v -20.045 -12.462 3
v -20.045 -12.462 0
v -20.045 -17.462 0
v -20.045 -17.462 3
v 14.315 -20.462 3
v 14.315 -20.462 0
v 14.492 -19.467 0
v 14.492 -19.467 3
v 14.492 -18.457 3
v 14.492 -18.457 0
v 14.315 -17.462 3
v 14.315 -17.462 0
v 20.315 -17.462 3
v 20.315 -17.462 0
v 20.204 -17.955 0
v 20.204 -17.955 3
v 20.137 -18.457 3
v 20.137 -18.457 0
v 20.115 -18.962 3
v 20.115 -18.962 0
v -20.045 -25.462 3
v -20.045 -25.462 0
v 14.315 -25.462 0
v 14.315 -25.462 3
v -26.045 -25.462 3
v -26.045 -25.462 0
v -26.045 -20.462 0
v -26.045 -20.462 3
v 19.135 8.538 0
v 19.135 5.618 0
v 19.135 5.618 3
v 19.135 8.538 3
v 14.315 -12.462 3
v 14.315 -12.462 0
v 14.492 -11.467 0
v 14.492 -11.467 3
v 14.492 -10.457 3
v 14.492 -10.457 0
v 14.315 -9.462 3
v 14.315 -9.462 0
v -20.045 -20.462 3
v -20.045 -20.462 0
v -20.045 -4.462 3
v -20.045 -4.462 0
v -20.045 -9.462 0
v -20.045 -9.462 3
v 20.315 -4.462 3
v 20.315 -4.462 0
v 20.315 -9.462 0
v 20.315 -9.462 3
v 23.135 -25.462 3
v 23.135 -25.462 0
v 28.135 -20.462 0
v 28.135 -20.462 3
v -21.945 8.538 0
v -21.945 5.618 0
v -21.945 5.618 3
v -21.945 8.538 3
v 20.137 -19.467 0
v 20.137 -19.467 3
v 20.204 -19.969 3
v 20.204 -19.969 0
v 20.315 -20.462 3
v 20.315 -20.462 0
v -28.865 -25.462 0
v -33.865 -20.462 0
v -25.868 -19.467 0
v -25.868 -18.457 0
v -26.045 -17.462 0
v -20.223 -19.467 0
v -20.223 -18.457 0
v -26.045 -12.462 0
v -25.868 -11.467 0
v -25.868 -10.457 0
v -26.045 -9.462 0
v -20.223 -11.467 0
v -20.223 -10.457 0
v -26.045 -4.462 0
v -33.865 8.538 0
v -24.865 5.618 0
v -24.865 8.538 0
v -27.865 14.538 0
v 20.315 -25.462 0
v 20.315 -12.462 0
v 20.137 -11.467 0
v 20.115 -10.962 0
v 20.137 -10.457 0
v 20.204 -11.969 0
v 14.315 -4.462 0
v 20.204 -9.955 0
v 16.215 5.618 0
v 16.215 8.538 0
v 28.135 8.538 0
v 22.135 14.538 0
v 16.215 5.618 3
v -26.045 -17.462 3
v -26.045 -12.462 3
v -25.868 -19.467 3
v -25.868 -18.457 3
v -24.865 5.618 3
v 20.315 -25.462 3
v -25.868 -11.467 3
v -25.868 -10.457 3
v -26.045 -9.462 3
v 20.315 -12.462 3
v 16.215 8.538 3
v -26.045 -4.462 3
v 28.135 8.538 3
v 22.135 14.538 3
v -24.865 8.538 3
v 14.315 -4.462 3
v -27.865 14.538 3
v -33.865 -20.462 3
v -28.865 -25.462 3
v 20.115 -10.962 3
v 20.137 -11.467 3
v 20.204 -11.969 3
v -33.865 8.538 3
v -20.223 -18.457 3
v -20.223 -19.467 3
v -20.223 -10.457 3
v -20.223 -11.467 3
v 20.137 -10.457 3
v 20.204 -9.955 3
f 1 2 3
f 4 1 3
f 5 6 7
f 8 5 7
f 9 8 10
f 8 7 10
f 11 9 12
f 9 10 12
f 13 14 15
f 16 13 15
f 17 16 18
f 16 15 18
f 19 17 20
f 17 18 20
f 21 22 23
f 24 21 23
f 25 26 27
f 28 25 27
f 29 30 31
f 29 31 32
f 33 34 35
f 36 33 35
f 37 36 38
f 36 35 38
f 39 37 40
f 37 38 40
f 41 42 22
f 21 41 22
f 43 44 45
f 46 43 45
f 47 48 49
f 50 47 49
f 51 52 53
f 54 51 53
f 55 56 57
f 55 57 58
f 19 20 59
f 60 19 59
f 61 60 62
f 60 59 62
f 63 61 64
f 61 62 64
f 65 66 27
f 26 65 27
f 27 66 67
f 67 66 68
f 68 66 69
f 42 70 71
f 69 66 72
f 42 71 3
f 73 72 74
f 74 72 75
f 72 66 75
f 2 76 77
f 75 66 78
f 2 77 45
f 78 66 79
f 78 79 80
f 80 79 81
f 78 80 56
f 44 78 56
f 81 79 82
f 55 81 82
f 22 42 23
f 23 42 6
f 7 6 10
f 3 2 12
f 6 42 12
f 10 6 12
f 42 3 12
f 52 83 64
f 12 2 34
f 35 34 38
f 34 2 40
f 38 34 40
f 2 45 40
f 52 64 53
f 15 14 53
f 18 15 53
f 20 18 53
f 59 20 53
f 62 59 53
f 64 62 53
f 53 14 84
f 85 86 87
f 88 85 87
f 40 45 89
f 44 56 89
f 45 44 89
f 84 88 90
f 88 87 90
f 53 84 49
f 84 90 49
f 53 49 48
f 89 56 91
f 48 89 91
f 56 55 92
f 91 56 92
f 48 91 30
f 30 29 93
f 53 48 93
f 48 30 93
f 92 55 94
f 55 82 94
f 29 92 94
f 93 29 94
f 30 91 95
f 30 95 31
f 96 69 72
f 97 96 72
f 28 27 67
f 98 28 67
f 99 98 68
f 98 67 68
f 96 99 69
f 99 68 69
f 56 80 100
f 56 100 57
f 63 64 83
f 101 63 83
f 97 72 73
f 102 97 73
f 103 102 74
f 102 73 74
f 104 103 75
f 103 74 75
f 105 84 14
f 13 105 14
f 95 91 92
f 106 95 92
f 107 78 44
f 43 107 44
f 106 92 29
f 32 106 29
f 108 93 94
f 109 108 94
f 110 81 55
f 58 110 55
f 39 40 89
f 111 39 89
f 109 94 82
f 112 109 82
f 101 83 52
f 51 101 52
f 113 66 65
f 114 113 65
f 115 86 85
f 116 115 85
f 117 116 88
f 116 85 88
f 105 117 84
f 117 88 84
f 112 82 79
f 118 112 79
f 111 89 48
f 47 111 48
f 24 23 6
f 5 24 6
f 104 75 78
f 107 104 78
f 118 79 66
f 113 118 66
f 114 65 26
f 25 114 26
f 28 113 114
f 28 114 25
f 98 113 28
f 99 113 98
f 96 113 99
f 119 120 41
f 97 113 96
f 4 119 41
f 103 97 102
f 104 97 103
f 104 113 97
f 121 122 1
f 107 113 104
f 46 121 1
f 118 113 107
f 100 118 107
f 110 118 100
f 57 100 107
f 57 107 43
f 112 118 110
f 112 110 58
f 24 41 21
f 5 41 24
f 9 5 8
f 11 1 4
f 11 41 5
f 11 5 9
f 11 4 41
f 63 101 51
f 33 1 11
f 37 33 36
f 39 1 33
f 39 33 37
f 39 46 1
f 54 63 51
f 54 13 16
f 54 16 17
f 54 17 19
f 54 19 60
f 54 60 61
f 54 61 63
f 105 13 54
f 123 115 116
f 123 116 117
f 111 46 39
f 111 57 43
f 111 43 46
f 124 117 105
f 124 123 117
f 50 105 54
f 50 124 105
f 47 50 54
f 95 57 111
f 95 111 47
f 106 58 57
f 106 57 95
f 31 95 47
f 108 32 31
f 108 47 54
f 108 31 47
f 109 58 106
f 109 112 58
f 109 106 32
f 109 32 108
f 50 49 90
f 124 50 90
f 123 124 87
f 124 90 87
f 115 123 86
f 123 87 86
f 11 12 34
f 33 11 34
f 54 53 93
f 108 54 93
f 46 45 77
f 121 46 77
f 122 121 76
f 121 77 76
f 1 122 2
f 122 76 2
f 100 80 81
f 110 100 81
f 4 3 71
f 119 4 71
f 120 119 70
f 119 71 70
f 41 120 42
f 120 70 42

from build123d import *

# Parameters (mm, degrees)
SKETCH1_W           = 2.92
SKETCH1_H           = 2.92
BOSS_EXTRUDE1_DEPTH = 3


with BuildPart() as part:
    # Sketch1 → Boss-Extrude1 (new body)
    with BuildSketch(Plane.XY):
        with BuildLine():
            Line((28.134570185, 8.537968033), (22.134570185, 14.537968033))
            Line((22.134570185, 14.537968033), (-27.865429815, 14.537968033))
            Line((-27.865429815, 14.537968033), (-33.865429815, 8.537968033))
            Line((-33.865429815, 8.537968033), (-33.865429815, -20.462031967))
            Line((-33.865429815, -20.462031967), (-28.865429815, -25.462031967))
            Line((-28.865429815, -25.462031967), (-26.045429815, -25.462031967))
            Line((-26.045429815, -25.462031967), (-26.045429815, -20.462031967))
            ThreePointArc((-26.045429815, -20.462031967), (-25.845429815, -18.962031967), (-26.045429815, -17.462031967))
            Line((-26.045429815, -17.462031967), (-26.045429815, -12.462031967))
            ThreePointArc((-26.045429815, -12.462031967), (-25.845429815, -10.962031967), (-26.045429815, -9.462031967))
            Line((-26.045429815, -9.462031967), (-26.045429815, -4.462031967))
            Line((-26.045429815, -4.462031967), (-20.045429815, -4.462031967))
            Line((-20.045429815, -4.462031967), (-20.045429815, -9.462031967))
            ThreePointArc((-20.045429815, -9.462031967), (-20.245429815, -10.962031967), (-20.045429815, -12.462031967))
            Line((-20.045429815, -12.462031967), (-20.045429815, -17.462031967))
            ThreePointArc((-20.045429815, -17.462031967), (-20.245429815, -18.962031967), (-20.045429815, -20.462031967))
            Line((-20.045429815, -20.462031967), (-20.045429815, -25.462031967))
            Line((-20.045429815, -25.462031967), (14.314570185, -25.462031967))
            Line((14.314570185, -25.462031967), (14.314570185, -20.462031967))
            ThreePointArc((14.314570185, -20.462031967), (14.514570185, -18.962031967), (14.314570185, -17.462031967))
            Line((14.314570185, -17.462031967), (14.314570185, -12.462031967))
            ThreePointArc((14.314570185, -12.462031967), (14.514570185, -10.962031967), (14.314570185, -9.462031967))
            Line((14.314570185, -9.462031967), (14.314570185, -4.462031967))
            Line((14.314570185, -4.462031967), (20.314570185, -4.462031967))
            Line((20.314570185, -4.462031967), (20.314570185, -9.462031967))
            ThreePointArc((20.314570185, -9.462031967), (20.164790454, -10.20539467), (20.114570185, -10.962031967))
            ThreePointArc((20.114570185, -10.962031967), (20.164790454, -11.718669265), (20.314570185, -12.462031967))
            Line((20.314570185, -12.462031967), (20.314570185, -17.462031967))
            ThreePointArc((20.314570185, -17.462031967), (20.164790454, -18.20539467), (20.114570185, -18.962031967))
            ThreePointArc((20.114570185, -18.962031967), (20.164790454, -19.718669265), (20.314570185, -20.462031967))
            Line((20.314570185, -20.462031967), (20.314570185, -25.462031967))
            Line((20.314570185, -25.462031967), (23.134570185, -25.462031967))
            Line((23.134570185, -25.462031967), (28.134570185, -20.462031967))
            Line((28.134570185, -20.462031967), (28.134570185, 8.537968033))
        make_face()
        with Locations((-23.405429815, 7.077968033)):
            Rectangle(SKETCH1_W, SKETCH1_H, mode=Mode.SUBTRACT)
        with Locations((17.674570185, 7.077968033)):
            Rectangle(SKETCH1_W, SKETCH1_H, mode=Mode.SUBTRACT)
    extrude(amount=BOSS_EXTRUDE1_DEPTH)


solid = part.part
